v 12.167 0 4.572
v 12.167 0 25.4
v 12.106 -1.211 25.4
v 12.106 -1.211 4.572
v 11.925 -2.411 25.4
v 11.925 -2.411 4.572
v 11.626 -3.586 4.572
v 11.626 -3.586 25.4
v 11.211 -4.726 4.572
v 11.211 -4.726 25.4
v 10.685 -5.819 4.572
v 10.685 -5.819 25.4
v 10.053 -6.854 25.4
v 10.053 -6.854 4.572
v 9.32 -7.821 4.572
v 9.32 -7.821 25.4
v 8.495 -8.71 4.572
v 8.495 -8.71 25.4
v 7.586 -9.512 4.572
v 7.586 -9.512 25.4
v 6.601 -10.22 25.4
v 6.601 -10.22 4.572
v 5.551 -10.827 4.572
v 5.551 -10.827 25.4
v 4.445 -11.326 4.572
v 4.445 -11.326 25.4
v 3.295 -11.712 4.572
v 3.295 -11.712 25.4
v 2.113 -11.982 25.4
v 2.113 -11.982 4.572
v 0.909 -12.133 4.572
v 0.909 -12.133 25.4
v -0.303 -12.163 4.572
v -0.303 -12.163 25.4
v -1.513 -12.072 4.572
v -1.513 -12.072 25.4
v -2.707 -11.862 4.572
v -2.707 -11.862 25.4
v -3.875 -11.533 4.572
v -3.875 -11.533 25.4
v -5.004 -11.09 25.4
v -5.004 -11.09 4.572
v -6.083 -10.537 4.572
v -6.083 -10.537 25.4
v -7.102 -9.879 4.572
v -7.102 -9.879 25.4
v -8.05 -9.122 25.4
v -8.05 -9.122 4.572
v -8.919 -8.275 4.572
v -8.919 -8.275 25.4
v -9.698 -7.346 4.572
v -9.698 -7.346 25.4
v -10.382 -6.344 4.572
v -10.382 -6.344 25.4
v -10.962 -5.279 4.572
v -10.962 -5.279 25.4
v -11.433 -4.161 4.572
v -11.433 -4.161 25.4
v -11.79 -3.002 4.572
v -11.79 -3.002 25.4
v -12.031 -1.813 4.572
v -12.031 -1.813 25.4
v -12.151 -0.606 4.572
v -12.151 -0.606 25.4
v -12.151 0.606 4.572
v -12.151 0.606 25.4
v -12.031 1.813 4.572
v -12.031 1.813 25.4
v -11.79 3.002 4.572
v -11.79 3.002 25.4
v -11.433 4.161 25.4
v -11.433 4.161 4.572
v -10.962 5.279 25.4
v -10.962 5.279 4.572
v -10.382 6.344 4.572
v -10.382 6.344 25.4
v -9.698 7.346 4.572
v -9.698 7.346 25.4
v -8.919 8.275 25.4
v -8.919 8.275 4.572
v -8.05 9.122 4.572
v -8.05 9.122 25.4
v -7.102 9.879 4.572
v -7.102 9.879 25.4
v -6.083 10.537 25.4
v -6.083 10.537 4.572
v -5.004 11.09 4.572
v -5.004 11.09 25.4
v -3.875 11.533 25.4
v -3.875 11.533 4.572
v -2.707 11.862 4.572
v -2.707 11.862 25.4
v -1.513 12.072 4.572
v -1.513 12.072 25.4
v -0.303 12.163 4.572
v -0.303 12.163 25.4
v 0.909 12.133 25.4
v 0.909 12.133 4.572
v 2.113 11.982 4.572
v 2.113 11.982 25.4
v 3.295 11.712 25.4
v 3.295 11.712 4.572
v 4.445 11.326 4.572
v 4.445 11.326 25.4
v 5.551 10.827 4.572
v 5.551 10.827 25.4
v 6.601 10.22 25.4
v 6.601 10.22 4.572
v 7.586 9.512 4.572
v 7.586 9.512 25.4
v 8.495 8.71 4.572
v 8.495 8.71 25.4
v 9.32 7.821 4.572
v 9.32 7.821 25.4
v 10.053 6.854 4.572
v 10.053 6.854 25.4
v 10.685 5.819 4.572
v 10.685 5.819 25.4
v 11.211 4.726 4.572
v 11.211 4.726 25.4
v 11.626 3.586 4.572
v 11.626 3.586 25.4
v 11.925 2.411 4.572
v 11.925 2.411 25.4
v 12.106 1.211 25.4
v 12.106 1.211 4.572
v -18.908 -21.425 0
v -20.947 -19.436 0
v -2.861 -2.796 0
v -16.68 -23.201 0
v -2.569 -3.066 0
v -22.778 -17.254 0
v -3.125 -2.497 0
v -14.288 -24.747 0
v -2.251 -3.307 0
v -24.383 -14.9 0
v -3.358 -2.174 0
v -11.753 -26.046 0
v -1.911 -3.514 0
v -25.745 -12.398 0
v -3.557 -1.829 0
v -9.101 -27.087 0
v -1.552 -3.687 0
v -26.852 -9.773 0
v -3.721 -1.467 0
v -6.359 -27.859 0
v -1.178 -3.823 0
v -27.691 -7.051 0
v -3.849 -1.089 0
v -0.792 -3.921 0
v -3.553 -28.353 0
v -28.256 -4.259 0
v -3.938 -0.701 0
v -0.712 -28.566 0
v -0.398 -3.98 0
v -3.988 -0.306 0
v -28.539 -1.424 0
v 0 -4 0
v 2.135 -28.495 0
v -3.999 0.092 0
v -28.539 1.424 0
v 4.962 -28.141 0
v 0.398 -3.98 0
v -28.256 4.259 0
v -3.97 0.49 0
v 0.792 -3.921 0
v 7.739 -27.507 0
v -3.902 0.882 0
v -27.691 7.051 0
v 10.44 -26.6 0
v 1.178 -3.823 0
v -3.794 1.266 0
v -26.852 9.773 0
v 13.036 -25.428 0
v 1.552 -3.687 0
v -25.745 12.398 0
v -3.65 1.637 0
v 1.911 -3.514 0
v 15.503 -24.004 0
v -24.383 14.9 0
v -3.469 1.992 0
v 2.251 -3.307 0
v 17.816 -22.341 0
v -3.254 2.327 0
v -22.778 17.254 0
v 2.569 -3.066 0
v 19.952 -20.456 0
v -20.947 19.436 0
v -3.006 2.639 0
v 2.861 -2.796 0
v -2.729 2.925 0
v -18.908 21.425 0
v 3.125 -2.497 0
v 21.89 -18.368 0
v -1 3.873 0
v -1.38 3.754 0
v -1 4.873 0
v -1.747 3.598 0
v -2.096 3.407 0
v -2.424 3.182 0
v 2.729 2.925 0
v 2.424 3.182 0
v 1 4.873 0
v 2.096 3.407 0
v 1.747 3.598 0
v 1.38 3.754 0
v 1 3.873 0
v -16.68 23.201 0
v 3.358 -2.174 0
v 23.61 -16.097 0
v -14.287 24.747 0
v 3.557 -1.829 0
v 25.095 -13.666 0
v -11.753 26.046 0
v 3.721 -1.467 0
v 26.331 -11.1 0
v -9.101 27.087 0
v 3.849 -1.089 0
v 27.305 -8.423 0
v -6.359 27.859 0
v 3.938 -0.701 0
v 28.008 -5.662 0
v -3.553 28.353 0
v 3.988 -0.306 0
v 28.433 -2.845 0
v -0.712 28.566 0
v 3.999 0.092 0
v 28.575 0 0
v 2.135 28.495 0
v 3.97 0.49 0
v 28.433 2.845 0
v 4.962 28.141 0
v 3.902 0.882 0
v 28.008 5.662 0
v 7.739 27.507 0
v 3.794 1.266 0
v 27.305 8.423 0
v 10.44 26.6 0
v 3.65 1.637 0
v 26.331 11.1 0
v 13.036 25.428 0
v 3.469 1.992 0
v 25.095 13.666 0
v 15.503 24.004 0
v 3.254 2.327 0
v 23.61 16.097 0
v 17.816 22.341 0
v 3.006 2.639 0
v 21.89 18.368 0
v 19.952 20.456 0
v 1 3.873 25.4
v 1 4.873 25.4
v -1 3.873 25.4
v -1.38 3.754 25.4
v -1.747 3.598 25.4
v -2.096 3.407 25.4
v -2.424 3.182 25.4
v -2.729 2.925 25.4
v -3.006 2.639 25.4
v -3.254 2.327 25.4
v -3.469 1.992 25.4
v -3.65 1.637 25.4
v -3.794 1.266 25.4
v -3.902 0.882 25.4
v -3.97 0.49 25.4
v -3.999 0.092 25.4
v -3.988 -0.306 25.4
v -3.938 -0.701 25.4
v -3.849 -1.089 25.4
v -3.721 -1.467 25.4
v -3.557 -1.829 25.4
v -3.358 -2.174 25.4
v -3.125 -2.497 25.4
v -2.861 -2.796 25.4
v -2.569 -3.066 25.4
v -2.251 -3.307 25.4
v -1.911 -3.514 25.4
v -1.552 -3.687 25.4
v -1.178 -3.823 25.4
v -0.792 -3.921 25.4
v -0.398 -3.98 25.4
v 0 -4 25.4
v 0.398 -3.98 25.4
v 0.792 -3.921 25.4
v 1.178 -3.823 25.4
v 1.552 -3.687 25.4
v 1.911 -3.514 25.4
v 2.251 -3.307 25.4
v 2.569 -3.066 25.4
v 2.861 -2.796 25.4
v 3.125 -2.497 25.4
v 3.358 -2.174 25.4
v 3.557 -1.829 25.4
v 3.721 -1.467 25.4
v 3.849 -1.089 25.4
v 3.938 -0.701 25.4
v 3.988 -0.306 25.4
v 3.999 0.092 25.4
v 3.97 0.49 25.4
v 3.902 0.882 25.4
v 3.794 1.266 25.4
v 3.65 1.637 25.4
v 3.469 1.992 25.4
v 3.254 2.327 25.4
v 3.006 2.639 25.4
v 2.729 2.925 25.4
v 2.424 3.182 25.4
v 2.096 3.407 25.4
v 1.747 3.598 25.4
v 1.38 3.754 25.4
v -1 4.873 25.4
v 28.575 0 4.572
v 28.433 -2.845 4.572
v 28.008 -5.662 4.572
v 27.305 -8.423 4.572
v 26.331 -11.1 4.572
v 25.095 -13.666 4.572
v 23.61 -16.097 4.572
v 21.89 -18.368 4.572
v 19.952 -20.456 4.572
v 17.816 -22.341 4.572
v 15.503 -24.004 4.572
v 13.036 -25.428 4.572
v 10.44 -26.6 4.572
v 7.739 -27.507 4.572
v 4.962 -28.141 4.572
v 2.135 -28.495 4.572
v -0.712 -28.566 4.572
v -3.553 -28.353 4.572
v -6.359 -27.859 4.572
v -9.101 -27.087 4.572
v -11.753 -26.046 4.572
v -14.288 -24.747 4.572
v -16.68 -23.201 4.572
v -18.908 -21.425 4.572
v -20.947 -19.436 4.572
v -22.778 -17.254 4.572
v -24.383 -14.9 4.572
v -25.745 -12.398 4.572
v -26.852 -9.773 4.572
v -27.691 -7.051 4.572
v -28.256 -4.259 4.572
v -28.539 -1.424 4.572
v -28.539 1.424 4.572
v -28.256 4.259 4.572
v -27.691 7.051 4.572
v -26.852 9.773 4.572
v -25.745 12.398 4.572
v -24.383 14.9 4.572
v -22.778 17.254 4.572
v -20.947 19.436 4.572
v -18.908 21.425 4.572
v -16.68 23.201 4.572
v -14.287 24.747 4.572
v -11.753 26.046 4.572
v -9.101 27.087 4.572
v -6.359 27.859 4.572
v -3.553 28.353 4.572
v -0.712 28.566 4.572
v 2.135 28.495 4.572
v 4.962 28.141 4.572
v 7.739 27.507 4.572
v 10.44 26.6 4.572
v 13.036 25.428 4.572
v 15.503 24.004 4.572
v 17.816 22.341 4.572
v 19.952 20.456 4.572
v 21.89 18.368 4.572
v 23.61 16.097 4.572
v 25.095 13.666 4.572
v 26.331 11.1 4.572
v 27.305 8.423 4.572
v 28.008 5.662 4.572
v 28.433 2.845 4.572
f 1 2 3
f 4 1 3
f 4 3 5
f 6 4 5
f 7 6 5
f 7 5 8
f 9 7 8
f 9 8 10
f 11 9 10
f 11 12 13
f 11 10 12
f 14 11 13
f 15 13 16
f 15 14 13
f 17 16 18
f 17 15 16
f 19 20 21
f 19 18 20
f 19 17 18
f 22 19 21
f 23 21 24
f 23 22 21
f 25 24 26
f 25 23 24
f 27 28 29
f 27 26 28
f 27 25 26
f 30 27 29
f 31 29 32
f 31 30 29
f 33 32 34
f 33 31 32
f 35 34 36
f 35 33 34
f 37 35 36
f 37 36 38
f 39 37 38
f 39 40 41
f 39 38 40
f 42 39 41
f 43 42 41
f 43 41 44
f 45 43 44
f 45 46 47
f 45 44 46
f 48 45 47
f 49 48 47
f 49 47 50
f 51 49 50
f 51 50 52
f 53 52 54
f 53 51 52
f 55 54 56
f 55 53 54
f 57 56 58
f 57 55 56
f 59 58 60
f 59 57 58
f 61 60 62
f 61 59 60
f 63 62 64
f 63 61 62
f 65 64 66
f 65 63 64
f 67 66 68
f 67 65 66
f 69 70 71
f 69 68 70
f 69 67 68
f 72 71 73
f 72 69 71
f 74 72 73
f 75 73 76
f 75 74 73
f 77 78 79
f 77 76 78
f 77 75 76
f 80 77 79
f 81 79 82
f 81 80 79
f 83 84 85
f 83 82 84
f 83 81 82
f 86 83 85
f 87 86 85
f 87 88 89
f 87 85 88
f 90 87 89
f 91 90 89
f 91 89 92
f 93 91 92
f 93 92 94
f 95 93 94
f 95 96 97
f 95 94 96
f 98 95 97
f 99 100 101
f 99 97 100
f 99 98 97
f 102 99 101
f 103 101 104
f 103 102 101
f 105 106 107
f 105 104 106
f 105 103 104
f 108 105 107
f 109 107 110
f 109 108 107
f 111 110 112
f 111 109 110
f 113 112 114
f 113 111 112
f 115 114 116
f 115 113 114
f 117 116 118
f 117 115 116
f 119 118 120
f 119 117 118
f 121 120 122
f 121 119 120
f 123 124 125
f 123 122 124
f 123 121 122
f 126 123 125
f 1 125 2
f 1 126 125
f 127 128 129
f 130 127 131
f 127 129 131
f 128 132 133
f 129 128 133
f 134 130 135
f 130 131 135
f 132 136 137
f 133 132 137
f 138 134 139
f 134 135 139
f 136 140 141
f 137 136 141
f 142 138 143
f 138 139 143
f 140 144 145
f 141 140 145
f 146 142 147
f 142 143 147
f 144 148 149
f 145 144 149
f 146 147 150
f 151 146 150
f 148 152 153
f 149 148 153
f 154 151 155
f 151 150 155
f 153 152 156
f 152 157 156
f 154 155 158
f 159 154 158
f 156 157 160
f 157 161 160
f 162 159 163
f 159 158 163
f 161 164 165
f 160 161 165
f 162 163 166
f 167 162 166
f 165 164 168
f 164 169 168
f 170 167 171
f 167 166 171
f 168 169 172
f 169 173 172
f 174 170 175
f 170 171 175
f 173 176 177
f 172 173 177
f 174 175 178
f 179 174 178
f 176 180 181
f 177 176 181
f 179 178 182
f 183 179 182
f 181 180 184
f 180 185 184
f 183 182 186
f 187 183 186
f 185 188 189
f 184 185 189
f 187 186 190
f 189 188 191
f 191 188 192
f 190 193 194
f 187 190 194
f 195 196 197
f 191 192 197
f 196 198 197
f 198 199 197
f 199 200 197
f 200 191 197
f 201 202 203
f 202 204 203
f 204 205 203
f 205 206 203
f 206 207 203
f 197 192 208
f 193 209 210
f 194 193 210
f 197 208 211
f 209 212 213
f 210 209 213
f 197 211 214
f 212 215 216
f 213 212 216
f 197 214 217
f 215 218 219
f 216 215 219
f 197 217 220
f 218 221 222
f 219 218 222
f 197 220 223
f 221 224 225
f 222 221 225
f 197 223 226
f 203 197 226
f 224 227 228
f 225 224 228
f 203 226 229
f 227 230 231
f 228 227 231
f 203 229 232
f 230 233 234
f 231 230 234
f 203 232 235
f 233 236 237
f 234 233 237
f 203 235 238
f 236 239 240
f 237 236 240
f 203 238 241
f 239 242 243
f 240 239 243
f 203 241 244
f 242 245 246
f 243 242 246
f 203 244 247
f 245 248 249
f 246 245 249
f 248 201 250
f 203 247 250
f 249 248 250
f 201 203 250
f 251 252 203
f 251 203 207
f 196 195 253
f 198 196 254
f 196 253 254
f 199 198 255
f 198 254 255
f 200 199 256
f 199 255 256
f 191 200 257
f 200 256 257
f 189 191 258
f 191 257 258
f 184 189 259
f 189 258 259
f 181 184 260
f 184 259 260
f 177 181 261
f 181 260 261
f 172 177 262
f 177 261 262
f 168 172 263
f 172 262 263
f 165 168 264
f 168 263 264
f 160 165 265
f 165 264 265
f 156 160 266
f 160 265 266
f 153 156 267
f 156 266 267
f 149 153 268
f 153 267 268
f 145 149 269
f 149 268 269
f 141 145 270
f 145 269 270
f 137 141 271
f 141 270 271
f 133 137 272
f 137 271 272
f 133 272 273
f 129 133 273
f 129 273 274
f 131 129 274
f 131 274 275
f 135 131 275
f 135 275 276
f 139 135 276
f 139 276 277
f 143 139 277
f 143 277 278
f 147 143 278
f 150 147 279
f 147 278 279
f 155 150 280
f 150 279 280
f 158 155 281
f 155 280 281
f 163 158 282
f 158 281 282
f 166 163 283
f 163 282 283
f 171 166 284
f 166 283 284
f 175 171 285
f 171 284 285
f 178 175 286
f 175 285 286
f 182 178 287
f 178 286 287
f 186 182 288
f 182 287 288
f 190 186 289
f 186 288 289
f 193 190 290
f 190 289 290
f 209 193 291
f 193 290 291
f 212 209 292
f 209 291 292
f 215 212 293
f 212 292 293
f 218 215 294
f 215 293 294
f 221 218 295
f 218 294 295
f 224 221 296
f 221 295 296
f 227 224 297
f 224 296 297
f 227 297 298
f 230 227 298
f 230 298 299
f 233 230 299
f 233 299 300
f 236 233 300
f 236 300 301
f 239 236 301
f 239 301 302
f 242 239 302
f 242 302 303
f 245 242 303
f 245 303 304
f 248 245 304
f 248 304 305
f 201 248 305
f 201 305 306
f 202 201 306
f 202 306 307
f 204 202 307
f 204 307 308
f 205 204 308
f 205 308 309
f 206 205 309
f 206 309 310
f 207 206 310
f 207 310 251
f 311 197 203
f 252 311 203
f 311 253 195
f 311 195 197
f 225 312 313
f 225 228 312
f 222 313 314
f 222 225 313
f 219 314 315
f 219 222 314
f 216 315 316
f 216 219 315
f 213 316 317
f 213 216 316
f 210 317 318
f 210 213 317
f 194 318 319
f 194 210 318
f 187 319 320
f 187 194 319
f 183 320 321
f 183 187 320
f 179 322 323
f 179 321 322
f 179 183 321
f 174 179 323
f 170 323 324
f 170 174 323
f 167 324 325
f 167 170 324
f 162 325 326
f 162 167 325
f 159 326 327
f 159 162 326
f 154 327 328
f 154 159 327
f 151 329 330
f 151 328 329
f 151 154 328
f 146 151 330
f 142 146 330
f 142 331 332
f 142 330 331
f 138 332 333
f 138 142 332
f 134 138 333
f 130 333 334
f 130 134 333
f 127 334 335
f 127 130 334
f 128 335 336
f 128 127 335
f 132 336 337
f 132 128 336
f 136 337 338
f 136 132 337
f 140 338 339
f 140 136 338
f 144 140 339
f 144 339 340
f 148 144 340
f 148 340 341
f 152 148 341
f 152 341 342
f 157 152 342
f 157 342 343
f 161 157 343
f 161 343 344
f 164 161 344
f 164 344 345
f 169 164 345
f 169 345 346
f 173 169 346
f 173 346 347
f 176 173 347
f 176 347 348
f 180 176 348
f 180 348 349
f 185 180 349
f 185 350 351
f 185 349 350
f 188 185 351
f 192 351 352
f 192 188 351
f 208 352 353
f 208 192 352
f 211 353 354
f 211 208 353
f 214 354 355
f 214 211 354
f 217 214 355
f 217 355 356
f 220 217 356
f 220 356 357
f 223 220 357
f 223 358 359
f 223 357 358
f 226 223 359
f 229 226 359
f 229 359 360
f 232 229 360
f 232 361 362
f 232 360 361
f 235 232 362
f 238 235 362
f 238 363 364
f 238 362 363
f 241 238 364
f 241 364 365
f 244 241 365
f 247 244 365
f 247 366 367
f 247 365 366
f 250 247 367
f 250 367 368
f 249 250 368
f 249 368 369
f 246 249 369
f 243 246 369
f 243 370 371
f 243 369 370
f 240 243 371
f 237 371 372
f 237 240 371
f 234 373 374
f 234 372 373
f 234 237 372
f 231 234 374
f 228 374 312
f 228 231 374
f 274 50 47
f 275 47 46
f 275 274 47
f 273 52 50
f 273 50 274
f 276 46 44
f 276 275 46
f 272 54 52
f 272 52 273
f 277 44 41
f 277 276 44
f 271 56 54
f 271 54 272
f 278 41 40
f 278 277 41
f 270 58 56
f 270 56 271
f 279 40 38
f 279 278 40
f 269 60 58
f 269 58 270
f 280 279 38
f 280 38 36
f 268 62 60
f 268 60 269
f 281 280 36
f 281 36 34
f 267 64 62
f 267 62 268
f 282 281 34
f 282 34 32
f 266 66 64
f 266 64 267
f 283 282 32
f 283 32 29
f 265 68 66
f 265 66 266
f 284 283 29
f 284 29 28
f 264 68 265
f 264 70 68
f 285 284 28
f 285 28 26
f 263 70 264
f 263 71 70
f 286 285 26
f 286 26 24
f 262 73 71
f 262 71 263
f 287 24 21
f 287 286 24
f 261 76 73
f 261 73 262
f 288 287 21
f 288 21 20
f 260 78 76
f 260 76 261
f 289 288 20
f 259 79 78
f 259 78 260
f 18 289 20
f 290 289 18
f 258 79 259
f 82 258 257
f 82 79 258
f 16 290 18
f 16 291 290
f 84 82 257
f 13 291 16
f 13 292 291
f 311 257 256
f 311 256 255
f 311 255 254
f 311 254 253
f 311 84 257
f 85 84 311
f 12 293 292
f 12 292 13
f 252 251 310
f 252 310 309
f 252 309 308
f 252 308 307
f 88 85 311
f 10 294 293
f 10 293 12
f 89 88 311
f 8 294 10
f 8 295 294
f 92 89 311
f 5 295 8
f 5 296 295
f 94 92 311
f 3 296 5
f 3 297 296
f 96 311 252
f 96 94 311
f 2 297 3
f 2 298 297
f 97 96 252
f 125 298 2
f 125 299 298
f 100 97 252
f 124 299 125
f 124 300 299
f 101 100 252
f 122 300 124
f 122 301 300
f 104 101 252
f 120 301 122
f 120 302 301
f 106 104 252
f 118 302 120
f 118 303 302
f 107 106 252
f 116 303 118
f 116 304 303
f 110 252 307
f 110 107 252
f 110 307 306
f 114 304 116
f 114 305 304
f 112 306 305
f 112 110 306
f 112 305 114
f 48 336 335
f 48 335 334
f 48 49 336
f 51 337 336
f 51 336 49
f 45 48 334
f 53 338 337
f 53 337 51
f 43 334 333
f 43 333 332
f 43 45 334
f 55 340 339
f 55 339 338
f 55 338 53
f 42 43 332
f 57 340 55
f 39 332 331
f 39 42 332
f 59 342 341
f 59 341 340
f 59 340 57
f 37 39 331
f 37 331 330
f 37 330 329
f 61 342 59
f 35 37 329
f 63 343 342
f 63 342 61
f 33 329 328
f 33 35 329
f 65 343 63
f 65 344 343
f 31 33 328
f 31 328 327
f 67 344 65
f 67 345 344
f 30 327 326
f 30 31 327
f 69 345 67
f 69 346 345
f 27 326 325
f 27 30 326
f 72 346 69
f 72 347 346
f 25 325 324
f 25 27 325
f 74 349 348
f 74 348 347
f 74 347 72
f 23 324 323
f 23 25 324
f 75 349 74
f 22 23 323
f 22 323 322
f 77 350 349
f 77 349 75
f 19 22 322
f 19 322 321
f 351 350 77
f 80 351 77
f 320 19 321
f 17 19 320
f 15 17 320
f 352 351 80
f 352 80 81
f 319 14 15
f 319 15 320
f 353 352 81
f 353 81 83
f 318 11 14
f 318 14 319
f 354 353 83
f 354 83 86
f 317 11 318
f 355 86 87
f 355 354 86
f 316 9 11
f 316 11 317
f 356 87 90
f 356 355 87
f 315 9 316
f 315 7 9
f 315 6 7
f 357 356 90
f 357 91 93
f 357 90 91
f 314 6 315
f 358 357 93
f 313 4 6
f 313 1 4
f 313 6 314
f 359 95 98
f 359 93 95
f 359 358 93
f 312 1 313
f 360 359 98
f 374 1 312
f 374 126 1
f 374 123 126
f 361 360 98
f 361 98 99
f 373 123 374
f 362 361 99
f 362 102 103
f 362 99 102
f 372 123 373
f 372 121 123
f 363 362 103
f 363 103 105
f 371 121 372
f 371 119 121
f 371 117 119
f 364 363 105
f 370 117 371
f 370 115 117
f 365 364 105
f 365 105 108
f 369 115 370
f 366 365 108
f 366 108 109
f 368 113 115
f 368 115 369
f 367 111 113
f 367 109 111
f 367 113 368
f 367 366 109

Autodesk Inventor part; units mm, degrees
ref_plane "YZ Plane" through (0, 0, 0) normal (1, 0, 0) x (0, 1, 0)
ref_plane "XZ Plane" through (0, 0, 0) normal (0, 1, 0) x (-1, 0, 0)
ref_plane "XY Plane" through (0, 0, 0) normal (0, 0, 1) x (1, 0, 0)
sketch "Sketch1" plane through (0, 0, 0) normal (0, 0, 1) x (1, 0, 0)
  circle A0 centre (0, 0) radius 28.575
  dimension "d0" = 57.15
extrude "Extrusion1" add sketch "Sketch1" along normal blind 4.572
sketch "Sketch2" plane through (0, 0, 4.572) normal (0, 0, 1) x (1, 0, 0)
  circle A0 centre (0, 0) radius 28.575 projected
  circle A1 centre (0, 0) radius 12.1666
  dimension "d3" = 24.3332
extrude "Extrusion2" add sketch "Sketch2" along normal blind 20.828 contours A1
sketch "Sketch3" plane through (0, 0, 25.4) normal (0, 0, 1) x (1, 0, 0)
  circle A0 centre (0, 0) radius 12.1666 projected
  circle A1 centre (0, 0) radius 4
  line L0 (-1, 4.873) -> (1, 4.873)
  line L1 (1, 4.873) -> (1, 2.873)
  line L2 (1, 2.873) -> (-1, 2.873)
  line L3 (-1, 2.873) -> (-1, 4.873)
  point P0 (0, 4.873)
  point P1 (-1, 3.873)
  dimension "d6" = 8
  dimension "d7" = 2
  dimension "d8" = 2
extrude "Extrusion3" cut sketch "Sketch3" against normal through all contours A1 L3 L2 L1 | L1 L2 L3 A1 | A1 L3 L0 L1
properties part number "Hub 8mm key"
